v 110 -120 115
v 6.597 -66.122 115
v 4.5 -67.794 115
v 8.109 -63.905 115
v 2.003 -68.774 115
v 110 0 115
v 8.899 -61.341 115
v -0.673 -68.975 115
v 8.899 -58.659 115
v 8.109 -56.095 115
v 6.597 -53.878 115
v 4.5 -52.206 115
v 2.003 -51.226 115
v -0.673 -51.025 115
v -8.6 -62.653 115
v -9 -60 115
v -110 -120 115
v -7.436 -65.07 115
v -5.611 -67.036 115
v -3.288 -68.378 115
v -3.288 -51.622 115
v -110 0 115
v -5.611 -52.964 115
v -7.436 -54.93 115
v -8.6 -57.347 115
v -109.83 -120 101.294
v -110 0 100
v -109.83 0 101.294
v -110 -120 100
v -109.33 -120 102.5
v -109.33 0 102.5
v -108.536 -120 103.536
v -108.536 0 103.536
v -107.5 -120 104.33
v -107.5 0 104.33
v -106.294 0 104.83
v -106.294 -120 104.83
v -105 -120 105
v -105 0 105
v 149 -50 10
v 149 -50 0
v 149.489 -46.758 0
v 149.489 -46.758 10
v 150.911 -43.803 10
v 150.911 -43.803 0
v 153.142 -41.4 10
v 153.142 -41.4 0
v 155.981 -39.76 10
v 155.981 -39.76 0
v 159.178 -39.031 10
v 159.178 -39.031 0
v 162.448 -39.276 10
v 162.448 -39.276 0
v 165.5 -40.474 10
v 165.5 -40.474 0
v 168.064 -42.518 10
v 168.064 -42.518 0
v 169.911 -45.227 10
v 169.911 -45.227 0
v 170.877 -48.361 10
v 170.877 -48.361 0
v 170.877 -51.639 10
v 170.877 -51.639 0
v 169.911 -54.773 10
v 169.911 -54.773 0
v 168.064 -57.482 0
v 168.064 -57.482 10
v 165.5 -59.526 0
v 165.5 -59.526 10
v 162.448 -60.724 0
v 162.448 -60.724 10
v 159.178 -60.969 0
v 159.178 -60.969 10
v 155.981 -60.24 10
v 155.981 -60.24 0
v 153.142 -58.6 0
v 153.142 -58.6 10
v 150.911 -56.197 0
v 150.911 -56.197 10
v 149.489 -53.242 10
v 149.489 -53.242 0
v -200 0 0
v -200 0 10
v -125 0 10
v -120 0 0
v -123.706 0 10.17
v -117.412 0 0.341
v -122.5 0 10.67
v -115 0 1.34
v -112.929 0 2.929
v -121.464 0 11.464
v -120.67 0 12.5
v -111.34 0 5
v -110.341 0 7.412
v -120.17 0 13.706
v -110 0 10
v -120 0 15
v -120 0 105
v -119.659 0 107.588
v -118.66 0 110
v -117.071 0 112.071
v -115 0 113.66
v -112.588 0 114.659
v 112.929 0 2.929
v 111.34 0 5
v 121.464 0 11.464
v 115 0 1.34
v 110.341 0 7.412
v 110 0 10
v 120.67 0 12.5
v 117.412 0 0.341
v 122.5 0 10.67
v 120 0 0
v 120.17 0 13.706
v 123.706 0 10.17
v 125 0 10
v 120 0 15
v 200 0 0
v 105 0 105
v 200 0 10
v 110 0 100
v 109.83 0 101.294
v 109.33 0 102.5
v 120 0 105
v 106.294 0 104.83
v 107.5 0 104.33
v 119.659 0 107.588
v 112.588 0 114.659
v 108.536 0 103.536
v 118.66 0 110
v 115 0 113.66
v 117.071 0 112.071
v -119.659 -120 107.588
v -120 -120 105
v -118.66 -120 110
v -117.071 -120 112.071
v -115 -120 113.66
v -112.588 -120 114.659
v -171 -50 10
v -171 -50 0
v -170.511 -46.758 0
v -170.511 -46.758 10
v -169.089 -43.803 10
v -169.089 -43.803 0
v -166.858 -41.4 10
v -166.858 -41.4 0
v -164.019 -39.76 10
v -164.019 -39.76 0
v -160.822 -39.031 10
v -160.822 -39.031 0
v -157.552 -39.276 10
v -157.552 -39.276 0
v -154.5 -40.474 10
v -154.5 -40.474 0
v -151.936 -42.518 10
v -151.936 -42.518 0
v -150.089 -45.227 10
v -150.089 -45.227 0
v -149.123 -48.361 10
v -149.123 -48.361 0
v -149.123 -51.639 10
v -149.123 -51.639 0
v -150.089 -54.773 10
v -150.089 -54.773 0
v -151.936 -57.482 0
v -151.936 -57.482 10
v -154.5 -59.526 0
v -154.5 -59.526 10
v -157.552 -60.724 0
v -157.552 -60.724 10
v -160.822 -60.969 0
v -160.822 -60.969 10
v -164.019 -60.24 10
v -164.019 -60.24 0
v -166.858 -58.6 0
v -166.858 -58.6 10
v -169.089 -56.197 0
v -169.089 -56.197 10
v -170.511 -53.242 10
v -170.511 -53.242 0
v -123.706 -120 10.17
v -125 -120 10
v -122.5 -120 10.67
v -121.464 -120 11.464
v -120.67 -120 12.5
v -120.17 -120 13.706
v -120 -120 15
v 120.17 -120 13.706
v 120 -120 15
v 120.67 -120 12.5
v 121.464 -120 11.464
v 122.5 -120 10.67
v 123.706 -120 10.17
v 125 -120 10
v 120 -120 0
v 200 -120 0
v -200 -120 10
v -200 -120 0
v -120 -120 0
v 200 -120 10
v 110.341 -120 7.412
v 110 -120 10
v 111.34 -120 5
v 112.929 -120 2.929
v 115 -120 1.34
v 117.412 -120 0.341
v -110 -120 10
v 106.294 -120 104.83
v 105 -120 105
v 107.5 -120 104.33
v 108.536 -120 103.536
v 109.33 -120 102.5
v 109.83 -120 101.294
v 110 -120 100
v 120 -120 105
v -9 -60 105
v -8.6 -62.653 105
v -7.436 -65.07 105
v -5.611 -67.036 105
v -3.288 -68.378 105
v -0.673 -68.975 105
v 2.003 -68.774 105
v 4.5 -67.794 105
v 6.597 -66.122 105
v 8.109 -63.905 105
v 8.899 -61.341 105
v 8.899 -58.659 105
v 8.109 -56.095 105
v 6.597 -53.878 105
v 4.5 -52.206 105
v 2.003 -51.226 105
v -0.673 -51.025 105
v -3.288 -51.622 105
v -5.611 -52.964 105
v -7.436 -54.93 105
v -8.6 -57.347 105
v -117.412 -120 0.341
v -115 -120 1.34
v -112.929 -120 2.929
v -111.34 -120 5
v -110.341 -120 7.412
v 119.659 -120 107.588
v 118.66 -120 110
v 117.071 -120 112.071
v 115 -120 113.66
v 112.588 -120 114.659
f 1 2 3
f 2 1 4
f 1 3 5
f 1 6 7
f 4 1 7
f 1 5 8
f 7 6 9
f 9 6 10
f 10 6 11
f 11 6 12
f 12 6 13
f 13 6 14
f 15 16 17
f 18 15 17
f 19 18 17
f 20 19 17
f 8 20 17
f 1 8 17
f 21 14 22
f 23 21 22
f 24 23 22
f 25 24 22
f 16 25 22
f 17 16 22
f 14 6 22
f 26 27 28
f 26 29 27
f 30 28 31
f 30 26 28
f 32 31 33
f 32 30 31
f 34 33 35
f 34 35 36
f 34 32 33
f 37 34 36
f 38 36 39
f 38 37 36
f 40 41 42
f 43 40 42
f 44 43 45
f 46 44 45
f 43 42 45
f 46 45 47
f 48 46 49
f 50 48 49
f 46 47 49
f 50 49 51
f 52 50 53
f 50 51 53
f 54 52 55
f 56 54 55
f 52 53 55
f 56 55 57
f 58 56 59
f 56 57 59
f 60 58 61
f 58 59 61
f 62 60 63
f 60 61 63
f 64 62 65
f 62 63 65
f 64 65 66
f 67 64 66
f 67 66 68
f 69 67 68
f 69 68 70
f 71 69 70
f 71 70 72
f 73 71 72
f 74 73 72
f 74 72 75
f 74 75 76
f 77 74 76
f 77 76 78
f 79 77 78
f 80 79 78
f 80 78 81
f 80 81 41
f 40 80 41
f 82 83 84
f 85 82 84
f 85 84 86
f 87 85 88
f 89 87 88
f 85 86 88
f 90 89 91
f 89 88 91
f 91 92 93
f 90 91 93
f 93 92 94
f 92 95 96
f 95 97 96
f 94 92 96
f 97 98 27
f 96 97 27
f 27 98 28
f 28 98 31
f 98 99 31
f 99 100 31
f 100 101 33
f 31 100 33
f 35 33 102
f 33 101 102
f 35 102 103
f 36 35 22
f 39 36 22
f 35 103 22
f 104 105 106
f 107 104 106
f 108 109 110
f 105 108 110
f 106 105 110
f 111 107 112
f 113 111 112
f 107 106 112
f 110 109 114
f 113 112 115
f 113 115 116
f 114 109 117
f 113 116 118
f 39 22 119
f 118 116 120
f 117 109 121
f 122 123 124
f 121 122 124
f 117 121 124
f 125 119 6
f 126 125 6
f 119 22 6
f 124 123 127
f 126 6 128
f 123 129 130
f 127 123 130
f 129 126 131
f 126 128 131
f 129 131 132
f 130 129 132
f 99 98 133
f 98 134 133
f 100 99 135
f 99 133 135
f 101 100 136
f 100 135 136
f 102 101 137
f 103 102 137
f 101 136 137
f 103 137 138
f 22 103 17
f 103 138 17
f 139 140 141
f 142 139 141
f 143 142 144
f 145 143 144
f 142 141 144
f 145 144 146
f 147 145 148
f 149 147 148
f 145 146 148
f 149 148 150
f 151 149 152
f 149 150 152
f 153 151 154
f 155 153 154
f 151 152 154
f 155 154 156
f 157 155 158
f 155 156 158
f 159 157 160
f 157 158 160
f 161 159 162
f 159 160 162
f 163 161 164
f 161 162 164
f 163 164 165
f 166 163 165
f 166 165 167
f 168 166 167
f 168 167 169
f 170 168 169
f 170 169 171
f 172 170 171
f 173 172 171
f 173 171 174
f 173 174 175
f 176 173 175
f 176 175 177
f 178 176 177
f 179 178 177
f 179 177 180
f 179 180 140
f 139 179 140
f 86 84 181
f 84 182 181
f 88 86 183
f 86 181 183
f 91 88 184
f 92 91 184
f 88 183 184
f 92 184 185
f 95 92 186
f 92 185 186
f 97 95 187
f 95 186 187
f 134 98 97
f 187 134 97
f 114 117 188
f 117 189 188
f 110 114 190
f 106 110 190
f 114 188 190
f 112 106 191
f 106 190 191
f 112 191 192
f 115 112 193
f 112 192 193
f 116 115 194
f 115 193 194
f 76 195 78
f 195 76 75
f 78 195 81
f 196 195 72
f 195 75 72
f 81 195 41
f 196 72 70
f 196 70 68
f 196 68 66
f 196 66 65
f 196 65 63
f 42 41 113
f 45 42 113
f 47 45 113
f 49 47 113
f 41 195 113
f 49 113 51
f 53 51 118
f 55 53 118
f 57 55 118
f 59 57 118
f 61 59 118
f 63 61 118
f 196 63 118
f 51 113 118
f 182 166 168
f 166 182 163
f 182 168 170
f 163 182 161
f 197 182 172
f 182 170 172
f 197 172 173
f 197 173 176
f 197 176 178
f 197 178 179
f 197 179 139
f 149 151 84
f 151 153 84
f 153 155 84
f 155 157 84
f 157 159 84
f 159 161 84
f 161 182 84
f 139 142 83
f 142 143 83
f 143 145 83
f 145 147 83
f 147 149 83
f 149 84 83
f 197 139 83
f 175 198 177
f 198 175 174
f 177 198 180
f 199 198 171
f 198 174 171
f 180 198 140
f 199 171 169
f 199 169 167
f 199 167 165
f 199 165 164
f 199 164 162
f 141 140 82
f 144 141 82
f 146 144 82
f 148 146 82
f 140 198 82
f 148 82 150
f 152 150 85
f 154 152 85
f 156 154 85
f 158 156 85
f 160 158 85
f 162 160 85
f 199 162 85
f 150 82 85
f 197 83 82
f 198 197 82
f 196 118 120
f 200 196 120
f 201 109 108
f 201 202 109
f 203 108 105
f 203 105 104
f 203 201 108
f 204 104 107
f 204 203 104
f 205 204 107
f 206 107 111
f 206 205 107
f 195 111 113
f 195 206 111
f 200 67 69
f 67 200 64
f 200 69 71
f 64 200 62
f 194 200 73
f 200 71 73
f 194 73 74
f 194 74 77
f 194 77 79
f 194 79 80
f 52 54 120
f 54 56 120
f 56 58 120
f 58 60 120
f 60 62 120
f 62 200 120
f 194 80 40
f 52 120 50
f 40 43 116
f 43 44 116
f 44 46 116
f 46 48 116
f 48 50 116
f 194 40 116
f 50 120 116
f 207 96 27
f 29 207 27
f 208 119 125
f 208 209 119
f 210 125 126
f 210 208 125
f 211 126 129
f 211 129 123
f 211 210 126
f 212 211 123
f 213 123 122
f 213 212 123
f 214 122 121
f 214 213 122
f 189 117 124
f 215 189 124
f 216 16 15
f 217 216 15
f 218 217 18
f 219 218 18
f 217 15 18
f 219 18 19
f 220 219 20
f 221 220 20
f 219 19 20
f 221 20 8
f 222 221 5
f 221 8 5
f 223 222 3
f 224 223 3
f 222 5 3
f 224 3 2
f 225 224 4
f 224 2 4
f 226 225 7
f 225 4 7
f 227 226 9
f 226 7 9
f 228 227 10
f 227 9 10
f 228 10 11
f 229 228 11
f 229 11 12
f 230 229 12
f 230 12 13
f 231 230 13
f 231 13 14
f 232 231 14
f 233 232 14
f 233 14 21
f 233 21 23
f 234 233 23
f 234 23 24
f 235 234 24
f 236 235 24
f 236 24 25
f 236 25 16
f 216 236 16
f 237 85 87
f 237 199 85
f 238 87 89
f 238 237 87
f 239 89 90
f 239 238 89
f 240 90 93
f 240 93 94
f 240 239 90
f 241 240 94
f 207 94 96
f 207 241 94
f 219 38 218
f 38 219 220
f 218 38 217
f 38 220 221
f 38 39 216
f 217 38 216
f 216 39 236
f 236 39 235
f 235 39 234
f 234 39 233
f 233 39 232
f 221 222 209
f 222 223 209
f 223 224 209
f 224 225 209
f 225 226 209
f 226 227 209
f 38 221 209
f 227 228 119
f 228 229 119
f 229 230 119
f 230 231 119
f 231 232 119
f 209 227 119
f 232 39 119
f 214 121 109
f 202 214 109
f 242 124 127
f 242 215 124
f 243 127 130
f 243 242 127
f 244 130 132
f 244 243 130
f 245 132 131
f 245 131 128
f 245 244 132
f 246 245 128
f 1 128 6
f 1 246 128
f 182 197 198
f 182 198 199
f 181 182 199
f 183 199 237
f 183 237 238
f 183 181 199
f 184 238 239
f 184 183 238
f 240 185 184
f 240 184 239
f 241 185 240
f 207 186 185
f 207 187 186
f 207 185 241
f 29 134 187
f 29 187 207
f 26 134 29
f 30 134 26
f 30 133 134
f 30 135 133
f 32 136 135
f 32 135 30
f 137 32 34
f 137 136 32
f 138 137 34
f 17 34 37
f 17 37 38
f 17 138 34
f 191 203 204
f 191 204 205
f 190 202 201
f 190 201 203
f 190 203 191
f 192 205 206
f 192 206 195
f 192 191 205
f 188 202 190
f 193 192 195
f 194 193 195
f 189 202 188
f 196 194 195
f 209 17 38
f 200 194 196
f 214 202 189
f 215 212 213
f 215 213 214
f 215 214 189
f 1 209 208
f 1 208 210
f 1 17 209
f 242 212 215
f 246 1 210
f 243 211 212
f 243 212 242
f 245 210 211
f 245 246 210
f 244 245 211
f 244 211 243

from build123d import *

# Parameters (mm, degrees)
F1_DEPTH = 120
F3_D     = 22
F4_D     = 18
F5_R     = 10
F6_R     = 5


with BuildPart() as f1:
    # F0 (on Front) → F1 (new body)
    with BuildSketch(Plane.XZ):
        Polygon((-200, 10), (-200, 0), (-110, 0), (-110, 105), (110, 105), (110, 0), (200, 0), (200, 10), (120, 10), (120, 115), (-120, 115), (-120, 10), align=None)
    extrude(amount=F1_DEPTH)

    # F3 (through all)
    with Locations(Plane.XY.offset(10)):
        with Locations((160, -50), (-160, -50)):
            Hole(F3_D / 2)

    # F4 (through all)
    with Locations(Plane(origin=(0, 0, 10), x_dir=(1, 0, 0), z_dir=(0, 0, -1))):
        with Locations((0, 60)):
            Hole(F4_D / 2)

    # F5
    f5_edges = [f1.edges().sort_by_distance(p)[0] for p in [
        (-120, -60, 115),
        (120, -60, 115),
        (110, -60, 0),
        (-110, -60, 0),
    ]]
    fillet(f5_edges, radius=F5_R)

    # F6
    f6_edges = [f1.edges().sort_by_distance(p)[0] for p in [
        (-110, -60, 105),
        (110, -60, 105),
        (120, -60, 10),
        (-120, -60, 10),
    ]]
    fillet(f6_edges, radius=F6_R)


solid = f1.part
